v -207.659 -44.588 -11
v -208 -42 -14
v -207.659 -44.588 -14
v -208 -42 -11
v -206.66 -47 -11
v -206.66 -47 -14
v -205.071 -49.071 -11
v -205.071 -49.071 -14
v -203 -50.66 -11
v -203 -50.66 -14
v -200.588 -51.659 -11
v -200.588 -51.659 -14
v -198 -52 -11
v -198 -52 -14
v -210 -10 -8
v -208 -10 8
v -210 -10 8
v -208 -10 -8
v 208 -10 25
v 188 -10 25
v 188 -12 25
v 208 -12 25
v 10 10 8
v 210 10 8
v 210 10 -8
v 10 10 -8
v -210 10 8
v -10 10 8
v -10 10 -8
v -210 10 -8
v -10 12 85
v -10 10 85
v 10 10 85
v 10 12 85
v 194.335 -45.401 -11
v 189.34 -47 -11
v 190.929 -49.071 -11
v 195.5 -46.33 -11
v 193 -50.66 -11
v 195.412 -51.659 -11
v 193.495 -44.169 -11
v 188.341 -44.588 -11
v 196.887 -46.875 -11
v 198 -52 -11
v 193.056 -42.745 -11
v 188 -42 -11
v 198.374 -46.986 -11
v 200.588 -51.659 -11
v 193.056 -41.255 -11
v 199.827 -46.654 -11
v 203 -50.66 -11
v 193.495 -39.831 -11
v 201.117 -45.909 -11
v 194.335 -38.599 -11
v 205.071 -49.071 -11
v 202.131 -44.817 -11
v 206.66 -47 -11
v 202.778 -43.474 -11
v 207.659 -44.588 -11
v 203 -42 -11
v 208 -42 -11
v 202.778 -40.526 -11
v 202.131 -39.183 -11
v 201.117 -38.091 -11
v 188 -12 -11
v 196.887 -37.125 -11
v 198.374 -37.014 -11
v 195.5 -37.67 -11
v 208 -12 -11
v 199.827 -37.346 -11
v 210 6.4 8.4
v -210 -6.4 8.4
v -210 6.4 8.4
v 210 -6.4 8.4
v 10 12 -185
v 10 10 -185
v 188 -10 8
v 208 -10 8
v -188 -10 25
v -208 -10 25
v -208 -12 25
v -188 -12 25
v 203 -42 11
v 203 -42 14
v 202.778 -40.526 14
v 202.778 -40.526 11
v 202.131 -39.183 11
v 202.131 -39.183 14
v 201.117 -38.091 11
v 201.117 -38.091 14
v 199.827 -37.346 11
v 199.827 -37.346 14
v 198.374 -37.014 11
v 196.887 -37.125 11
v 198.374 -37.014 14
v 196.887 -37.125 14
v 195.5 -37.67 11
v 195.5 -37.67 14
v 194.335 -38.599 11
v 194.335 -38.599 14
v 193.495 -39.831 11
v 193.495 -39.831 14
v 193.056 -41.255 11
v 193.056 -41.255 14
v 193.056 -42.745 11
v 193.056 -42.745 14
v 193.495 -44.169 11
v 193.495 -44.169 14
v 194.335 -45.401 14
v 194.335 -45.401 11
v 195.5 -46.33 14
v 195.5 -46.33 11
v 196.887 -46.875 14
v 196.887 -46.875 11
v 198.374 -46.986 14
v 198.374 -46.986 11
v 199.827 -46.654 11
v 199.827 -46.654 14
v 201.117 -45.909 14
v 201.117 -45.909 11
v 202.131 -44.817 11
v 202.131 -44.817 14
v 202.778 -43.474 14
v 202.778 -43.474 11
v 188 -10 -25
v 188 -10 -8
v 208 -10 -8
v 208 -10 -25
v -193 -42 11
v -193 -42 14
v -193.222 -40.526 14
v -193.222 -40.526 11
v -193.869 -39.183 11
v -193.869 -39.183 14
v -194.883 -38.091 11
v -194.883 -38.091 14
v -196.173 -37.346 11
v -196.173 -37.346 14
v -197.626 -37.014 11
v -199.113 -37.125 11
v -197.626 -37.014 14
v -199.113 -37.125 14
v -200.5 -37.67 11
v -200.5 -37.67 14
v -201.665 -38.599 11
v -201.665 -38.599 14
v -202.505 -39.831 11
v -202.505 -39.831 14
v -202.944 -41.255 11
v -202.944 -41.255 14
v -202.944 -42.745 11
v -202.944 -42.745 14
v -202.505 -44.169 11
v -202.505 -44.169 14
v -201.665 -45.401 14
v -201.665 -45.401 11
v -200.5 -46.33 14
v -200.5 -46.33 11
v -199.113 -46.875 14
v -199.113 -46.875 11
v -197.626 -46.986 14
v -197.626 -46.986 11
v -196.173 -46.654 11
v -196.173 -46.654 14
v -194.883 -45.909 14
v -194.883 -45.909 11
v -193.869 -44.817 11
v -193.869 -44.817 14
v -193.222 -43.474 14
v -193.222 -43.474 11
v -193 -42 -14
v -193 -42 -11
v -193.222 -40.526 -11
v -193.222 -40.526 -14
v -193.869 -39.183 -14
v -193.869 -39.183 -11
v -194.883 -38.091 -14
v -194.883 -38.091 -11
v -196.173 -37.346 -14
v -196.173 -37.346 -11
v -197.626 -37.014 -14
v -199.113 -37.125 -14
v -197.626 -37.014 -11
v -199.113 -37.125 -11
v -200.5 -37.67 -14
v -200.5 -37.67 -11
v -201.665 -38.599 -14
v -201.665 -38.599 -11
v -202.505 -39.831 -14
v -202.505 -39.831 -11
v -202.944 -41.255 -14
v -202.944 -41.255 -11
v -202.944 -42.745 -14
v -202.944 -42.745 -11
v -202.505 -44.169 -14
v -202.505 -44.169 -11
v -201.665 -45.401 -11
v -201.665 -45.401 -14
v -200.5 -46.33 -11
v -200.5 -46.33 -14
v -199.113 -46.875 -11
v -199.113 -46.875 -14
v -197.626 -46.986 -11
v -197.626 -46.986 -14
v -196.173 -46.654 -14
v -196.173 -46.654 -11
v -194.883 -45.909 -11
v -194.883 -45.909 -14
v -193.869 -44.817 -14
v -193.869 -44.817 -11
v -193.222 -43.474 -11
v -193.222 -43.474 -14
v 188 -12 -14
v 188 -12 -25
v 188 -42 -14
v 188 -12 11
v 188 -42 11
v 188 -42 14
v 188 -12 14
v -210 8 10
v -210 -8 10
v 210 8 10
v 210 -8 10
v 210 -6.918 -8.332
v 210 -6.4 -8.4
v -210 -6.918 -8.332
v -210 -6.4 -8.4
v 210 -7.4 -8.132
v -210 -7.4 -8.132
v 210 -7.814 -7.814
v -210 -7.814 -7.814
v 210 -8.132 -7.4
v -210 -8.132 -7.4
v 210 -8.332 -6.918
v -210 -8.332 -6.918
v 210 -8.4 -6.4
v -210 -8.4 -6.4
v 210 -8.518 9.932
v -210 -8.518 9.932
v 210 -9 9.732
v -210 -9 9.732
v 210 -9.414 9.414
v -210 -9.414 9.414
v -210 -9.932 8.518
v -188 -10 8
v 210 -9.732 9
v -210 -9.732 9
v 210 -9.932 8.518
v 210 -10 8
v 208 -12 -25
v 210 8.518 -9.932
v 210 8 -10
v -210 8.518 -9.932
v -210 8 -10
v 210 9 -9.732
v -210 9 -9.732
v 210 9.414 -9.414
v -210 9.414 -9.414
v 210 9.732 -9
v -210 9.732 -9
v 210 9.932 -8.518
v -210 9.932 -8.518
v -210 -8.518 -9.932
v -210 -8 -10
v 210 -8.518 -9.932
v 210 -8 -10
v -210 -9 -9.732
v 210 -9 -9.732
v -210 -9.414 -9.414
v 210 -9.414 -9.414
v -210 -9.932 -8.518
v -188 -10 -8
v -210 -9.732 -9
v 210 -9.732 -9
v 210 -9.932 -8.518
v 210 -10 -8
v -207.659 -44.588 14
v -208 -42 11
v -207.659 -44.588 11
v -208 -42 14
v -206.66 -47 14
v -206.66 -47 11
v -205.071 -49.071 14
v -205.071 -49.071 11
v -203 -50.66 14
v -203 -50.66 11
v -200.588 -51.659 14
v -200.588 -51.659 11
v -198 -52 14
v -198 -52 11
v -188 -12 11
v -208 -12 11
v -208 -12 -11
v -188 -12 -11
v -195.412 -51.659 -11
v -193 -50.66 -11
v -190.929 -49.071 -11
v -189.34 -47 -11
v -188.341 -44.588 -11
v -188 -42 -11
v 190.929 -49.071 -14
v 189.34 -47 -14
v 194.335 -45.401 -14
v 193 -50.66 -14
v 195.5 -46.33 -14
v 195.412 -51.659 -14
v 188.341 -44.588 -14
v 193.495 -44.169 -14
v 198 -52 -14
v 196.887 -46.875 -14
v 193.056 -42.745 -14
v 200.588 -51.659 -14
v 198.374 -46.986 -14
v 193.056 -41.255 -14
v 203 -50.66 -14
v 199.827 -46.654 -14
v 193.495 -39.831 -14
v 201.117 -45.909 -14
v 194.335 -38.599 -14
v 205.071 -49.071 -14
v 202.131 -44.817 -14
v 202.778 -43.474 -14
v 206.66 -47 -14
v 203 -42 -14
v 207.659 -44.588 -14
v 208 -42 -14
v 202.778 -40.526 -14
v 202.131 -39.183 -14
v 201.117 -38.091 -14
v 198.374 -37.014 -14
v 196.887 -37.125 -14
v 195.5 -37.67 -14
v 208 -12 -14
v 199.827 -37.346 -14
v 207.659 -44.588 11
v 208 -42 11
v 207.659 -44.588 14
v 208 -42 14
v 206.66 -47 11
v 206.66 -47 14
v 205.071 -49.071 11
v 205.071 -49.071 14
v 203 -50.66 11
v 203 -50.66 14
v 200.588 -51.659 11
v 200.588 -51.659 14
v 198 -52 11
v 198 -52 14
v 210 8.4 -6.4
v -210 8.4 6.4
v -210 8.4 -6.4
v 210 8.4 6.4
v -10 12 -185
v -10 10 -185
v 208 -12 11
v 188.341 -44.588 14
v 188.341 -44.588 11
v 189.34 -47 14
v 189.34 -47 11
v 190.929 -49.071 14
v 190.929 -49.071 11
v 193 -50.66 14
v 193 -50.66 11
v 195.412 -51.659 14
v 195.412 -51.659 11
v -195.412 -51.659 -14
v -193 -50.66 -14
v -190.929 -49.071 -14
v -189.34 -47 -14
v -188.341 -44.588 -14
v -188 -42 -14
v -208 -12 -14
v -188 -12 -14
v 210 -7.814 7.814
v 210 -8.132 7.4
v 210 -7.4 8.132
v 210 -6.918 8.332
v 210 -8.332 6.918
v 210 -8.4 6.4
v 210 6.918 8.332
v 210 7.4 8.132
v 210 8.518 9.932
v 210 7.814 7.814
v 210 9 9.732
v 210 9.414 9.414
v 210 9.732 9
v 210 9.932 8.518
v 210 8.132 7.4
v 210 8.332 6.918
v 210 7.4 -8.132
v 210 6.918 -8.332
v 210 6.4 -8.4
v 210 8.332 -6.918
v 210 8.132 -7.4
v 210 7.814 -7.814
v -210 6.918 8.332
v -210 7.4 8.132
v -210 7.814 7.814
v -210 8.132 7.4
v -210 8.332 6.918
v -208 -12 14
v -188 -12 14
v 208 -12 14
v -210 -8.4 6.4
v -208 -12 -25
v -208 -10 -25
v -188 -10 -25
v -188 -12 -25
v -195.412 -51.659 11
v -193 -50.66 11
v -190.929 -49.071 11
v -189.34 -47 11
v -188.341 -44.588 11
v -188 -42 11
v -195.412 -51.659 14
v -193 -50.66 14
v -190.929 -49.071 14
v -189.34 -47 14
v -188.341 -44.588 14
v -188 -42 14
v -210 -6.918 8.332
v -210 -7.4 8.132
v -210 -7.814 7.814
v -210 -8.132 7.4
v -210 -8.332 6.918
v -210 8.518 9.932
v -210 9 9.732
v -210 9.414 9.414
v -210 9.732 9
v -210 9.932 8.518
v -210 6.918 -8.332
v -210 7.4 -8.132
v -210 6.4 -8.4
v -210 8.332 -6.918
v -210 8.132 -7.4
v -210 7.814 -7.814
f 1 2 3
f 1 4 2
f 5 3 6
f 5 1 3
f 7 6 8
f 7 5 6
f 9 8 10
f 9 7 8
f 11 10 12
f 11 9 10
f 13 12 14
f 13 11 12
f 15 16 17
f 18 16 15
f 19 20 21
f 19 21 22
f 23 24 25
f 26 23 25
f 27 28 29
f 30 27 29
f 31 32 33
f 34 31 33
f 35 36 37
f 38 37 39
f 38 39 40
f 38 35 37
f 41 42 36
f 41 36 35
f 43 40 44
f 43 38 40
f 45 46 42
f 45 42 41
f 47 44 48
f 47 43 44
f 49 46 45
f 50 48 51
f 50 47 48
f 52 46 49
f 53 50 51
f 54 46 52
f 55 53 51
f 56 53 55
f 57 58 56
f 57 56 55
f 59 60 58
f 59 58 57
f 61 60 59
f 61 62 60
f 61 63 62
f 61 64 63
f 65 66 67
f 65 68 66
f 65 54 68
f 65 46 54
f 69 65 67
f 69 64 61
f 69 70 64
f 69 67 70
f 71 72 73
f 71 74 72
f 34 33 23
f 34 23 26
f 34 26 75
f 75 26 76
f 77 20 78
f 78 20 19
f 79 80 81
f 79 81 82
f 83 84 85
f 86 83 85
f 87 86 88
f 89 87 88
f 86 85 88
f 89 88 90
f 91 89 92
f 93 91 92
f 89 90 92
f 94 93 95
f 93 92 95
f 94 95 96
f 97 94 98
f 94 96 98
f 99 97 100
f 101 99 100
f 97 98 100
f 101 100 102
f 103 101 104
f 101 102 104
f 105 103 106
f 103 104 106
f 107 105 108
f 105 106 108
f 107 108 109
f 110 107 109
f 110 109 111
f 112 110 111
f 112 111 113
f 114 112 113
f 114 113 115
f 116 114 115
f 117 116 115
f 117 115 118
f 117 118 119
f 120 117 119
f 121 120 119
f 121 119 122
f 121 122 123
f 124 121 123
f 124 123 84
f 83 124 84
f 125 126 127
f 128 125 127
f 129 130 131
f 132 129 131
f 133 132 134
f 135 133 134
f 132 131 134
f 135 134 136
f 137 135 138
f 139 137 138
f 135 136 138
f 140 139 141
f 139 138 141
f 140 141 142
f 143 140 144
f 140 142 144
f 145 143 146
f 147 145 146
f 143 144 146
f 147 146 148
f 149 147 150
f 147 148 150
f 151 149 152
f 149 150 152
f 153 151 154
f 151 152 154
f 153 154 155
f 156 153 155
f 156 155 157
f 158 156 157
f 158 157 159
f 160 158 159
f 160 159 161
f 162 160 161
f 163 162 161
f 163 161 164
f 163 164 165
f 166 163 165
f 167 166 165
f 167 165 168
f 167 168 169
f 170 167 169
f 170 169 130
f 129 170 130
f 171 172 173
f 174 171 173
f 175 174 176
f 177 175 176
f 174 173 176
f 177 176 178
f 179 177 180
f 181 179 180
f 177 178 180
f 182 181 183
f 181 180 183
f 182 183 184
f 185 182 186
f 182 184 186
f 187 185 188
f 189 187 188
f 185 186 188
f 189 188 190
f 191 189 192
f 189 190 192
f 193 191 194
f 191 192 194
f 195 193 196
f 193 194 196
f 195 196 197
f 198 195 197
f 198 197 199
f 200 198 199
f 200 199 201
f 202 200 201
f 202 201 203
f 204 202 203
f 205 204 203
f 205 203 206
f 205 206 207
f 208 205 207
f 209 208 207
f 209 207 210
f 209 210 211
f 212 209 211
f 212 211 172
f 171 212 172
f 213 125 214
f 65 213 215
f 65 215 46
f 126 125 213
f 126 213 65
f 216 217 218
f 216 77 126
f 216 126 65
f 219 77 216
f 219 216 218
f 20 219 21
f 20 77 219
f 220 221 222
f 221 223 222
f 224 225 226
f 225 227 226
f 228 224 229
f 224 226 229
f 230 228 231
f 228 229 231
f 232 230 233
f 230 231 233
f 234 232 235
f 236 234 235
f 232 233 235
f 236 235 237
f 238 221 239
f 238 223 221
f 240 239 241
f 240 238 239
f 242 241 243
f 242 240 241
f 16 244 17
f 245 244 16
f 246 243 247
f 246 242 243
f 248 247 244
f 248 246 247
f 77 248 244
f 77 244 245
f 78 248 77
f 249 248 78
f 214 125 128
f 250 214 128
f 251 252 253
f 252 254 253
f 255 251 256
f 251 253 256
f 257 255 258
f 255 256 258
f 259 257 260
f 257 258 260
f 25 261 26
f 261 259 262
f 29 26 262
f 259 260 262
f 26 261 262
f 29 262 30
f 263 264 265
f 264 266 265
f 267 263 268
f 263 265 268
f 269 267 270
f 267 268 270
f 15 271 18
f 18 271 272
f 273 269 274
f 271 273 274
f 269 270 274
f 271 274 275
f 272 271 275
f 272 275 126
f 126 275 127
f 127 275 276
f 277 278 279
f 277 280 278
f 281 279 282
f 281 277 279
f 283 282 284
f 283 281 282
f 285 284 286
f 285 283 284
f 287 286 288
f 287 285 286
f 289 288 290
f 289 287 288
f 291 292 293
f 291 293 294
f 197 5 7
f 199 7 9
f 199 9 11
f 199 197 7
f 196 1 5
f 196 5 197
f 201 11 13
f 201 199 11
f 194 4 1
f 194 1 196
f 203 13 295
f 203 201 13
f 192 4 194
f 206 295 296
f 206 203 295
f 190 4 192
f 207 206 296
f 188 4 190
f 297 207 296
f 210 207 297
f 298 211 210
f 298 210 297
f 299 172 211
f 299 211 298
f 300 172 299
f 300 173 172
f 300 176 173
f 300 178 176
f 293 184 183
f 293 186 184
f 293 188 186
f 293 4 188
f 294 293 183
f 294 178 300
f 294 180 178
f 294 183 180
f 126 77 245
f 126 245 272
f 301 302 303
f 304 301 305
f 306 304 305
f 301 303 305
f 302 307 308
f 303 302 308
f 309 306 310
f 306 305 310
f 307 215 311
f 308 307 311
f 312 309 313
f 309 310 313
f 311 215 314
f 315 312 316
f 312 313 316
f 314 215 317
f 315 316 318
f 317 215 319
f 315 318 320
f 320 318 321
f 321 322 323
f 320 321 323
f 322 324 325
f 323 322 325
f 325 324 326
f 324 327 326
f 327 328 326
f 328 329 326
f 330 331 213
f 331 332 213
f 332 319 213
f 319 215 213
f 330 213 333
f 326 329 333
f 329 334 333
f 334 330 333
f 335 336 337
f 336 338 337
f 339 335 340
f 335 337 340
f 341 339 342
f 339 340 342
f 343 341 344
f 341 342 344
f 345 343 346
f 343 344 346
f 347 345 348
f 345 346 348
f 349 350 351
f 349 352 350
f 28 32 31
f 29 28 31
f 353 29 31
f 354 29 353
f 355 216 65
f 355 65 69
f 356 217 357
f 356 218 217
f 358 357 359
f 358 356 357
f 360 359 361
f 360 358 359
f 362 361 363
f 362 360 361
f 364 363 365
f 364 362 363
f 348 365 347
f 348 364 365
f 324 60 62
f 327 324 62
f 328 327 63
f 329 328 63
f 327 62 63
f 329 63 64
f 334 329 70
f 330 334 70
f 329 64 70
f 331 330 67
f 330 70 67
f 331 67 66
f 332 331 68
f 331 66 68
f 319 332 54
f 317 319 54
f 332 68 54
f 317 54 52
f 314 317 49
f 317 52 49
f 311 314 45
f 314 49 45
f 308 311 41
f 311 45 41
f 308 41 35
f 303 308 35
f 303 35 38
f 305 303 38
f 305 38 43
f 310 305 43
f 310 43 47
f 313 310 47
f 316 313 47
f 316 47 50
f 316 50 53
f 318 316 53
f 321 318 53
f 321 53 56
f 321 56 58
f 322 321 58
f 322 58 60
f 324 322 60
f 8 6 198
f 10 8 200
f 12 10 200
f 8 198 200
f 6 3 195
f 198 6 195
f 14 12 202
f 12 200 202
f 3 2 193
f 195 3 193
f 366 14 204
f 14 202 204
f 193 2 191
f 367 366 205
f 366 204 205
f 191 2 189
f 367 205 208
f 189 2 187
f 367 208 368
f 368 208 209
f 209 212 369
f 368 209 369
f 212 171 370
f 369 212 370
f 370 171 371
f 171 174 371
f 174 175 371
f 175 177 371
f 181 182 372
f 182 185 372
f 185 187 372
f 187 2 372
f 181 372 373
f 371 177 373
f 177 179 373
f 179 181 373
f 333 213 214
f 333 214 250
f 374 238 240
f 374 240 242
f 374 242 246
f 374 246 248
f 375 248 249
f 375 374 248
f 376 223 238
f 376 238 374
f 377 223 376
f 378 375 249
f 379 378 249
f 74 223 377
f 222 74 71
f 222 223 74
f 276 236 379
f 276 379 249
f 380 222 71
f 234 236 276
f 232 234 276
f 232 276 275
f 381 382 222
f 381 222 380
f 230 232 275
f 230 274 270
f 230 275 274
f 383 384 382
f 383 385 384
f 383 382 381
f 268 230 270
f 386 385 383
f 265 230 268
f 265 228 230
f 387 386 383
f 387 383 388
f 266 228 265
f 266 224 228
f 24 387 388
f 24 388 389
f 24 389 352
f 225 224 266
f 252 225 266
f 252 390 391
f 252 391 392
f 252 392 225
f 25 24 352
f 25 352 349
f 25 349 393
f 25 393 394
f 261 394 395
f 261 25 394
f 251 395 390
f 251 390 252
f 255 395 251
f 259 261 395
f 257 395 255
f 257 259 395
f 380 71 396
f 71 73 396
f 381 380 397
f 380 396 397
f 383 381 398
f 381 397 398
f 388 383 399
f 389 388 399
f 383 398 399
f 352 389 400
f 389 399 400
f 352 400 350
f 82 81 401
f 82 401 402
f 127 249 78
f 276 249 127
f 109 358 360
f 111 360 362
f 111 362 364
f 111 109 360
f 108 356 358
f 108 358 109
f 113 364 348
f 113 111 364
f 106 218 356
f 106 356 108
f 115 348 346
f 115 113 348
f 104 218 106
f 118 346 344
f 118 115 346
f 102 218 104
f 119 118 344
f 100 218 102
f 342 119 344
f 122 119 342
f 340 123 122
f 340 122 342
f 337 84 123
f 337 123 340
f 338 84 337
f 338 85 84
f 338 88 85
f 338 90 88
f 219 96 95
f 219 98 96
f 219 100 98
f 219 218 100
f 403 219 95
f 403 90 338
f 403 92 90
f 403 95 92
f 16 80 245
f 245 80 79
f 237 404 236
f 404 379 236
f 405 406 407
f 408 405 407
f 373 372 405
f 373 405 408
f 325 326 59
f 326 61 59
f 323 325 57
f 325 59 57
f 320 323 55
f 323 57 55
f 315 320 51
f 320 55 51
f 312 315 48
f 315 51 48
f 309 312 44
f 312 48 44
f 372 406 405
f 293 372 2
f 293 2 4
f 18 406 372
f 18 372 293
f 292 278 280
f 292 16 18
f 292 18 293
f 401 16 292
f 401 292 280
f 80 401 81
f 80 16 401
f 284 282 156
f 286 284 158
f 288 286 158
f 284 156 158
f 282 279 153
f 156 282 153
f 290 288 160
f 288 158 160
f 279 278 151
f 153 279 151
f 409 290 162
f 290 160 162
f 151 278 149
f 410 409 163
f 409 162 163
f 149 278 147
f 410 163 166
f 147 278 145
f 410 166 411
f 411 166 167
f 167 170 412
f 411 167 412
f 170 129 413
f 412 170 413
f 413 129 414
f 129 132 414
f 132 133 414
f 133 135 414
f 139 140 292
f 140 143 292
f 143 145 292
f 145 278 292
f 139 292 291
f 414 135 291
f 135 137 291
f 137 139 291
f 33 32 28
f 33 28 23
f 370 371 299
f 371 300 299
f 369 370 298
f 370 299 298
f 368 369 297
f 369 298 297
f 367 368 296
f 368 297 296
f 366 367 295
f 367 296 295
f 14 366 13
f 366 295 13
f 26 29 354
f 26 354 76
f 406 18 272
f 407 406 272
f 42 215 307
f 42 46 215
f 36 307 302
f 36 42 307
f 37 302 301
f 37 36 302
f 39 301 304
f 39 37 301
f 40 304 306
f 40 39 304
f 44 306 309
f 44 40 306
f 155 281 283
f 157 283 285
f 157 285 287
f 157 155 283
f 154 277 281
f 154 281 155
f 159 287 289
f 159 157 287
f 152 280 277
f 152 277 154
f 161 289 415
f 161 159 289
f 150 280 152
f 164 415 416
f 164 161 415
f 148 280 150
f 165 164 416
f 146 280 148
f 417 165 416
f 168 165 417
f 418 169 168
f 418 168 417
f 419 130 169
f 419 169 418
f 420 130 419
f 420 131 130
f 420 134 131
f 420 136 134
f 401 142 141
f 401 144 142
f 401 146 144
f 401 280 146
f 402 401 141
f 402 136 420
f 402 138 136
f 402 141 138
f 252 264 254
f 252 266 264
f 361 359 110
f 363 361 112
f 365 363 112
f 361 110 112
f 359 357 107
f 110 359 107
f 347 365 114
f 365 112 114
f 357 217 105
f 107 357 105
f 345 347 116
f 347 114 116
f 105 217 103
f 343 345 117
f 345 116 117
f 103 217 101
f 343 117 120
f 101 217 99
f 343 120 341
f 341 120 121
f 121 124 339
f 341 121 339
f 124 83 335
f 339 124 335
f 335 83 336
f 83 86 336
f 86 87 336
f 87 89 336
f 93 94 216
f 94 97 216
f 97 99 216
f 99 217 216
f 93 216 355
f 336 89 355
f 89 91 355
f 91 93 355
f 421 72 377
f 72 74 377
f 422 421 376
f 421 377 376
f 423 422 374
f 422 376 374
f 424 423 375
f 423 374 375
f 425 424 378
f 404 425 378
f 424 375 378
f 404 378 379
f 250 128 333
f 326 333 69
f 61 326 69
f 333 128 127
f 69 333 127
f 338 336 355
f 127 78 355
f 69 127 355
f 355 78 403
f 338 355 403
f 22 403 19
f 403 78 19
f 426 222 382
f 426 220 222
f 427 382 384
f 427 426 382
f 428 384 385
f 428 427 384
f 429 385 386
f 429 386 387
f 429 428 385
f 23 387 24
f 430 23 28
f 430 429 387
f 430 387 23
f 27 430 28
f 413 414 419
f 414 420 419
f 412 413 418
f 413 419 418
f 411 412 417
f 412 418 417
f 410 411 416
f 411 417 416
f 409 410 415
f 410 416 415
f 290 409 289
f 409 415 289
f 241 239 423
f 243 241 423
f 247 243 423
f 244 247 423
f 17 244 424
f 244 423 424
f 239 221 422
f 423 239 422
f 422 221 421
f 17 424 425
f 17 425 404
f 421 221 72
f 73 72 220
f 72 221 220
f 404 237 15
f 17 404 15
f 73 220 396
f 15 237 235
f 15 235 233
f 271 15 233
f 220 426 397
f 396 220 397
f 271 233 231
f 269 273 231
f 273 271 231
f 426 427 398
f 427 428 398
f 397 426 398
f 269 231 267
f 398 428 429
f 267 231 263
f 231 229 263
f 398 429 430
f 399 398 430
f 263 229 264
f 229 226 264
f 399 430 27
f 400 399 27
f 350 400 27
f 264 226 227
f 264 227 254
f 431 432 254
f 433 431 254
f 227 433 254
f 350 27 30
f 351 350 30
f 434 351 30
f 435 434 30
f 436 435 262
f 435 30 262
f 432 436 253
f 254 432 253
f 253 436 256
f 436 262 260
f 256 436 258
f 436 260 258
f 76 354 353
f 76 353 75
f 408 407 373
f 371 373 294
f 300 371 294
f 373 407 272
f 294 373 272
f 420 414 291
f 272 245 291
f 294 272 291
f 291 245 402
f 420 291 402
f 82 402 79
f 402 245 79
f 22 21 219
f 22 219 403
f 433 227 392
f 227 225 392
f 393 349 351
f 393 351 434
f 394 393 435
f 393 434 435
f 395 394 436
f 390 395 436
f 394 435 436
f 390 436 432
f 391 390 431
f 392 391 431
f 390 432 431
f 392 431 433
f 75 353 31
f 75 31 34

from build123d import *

# Parameters (mm, degrees)
SKETCH2_W           = 20
SKETCH2_H           = 20
SKETCH2_W_2         = 16.8
SKETCH2_H_2         = 16.8
BOSS_EXTRUDE1_DEPTH = 210
FILLET1_R           = 2
SKETCH3_W           = 20
SKETCH3_H           = 50
BOSS_EXTRUDE2_DEPTH = 2
SKETCH4_W           = 20
SKETCH4_H           = 3
BOSS_EXTRUDE3_DEPTH = 40
FILLET2_R           = 10
SKETCH5_R           = 5
CUT_EXTRUDE1_DEPTH  = 40
SKETCH6_W           = 20
SKETCH6_H           = 270
BOSS_EXTRUDE4_DEPTH = 2


with BuildPart() as part:
    # Sketch2 → Boss-Extrude1 (new, symmetric)
    with BuildSketch(Plane(origin=(0, 0, 0), x_dir=(0, 0, -1), z_dir=(1, 0, 0))):
        Rectangle(SKETCH2_W, SKETCH2_H)
        Rectangle(SKETCH2_W_2, SKETCH2_H_2, mode=Mode.SUBTRACT)
    extrude(amount=BOSS_EXTRUDE1_DEPTH, both=True)

    # Fillet1
    fillet1_edges = [part.edges().sort_by_distance(p)[0] for p in [
        (0, 8.4, 8.4),
        (0, -8.4, 8.4),
        (0, -8.4, -8.4),
        (0, 8.4, -8.4),
        (0, 10, 10),
        (0, -10, 10),
        (0, -10, -10),
        (0, 10, -10),
    ]]
    fillet(fillet1_edges, radius=FILLET1_R)

    # Sketch3 → Boss-Extrude2 (add)
    with BuildSketch(Plane.XZ.offset(10)):
        with Locations((-198, 0)):
            Rectangle(SKETCH3_W, SKETCH3_H)
        with Locations((198, 0)):
            Rectangle(SKETCH3_W, SKETCH3_H)
    extrude(amount=BOSS_EXTRUDE2_DEPTH)

    # Sketch4 → Boss-Extrude3 (add)
    with BuildSketch(Plane.XZ.offset(12)):
        with Locations((-198, 12.5)):
            Rectangle(SKETCH4_W, SKETCH4_H)
        with Locations((-198, -12.5)):
            Rectangle(SKETCH4_W, SKETCH4_H)
        with Locations((198, 12.5)):
            Rectangle(SKETCH4_W, SKETCH4_H)
        with Locations((198, -12.5)):
            Rectangle(SKETCH4_W, SKETCH4_H)
    extrude(amount=BOSS_EXTRUDE3_DEPTH)

    # Fillet2
    fillet2_edges = [part.edges().sort_by_distance(p)[0] for p in [
        (188, -52, 12.5),
        (208, -52, 12.5),
        (208, -52, -12.5),
        (188, -52, -12.5),
        (-188, -52, 12.5),
        (-188, -52, -12.5),
        (-208, -52, 12.5),
        (-208, -52, -12.5),
    ]]
    fillet(fillet2_edges, radius=FILLET2_R - 0.0001)  # a hair under: the kernel refuses the full size

    # Sketch5 → Cut-Extrude1 (cut)
    with BuildSketch(Plane.XY.offset(14)):
        with Locations((-198, -42)):
            Circle(SKETCH5_R)
        with Locations((198, -42)):
            Circle(SKETCH5_R)
    extrude(amount=-CUT_EXTRUDE1_DEPTH, mode=Mode.SUBTRACT)

    # Sketch6 → Boss-Extrude4 (add)
    with BuildSketch(Plane(origin=(0, 10, 0), x_dir=(1, 0, 0), z_dir=(0, 1, 0))):
        with Locations((0, 50)):
            Rectangle(SKETCH6_W, SKETCH6_H)
    extrude(amount=BOSS_EXTRUDE4_DEPTH)


solid = part.part
